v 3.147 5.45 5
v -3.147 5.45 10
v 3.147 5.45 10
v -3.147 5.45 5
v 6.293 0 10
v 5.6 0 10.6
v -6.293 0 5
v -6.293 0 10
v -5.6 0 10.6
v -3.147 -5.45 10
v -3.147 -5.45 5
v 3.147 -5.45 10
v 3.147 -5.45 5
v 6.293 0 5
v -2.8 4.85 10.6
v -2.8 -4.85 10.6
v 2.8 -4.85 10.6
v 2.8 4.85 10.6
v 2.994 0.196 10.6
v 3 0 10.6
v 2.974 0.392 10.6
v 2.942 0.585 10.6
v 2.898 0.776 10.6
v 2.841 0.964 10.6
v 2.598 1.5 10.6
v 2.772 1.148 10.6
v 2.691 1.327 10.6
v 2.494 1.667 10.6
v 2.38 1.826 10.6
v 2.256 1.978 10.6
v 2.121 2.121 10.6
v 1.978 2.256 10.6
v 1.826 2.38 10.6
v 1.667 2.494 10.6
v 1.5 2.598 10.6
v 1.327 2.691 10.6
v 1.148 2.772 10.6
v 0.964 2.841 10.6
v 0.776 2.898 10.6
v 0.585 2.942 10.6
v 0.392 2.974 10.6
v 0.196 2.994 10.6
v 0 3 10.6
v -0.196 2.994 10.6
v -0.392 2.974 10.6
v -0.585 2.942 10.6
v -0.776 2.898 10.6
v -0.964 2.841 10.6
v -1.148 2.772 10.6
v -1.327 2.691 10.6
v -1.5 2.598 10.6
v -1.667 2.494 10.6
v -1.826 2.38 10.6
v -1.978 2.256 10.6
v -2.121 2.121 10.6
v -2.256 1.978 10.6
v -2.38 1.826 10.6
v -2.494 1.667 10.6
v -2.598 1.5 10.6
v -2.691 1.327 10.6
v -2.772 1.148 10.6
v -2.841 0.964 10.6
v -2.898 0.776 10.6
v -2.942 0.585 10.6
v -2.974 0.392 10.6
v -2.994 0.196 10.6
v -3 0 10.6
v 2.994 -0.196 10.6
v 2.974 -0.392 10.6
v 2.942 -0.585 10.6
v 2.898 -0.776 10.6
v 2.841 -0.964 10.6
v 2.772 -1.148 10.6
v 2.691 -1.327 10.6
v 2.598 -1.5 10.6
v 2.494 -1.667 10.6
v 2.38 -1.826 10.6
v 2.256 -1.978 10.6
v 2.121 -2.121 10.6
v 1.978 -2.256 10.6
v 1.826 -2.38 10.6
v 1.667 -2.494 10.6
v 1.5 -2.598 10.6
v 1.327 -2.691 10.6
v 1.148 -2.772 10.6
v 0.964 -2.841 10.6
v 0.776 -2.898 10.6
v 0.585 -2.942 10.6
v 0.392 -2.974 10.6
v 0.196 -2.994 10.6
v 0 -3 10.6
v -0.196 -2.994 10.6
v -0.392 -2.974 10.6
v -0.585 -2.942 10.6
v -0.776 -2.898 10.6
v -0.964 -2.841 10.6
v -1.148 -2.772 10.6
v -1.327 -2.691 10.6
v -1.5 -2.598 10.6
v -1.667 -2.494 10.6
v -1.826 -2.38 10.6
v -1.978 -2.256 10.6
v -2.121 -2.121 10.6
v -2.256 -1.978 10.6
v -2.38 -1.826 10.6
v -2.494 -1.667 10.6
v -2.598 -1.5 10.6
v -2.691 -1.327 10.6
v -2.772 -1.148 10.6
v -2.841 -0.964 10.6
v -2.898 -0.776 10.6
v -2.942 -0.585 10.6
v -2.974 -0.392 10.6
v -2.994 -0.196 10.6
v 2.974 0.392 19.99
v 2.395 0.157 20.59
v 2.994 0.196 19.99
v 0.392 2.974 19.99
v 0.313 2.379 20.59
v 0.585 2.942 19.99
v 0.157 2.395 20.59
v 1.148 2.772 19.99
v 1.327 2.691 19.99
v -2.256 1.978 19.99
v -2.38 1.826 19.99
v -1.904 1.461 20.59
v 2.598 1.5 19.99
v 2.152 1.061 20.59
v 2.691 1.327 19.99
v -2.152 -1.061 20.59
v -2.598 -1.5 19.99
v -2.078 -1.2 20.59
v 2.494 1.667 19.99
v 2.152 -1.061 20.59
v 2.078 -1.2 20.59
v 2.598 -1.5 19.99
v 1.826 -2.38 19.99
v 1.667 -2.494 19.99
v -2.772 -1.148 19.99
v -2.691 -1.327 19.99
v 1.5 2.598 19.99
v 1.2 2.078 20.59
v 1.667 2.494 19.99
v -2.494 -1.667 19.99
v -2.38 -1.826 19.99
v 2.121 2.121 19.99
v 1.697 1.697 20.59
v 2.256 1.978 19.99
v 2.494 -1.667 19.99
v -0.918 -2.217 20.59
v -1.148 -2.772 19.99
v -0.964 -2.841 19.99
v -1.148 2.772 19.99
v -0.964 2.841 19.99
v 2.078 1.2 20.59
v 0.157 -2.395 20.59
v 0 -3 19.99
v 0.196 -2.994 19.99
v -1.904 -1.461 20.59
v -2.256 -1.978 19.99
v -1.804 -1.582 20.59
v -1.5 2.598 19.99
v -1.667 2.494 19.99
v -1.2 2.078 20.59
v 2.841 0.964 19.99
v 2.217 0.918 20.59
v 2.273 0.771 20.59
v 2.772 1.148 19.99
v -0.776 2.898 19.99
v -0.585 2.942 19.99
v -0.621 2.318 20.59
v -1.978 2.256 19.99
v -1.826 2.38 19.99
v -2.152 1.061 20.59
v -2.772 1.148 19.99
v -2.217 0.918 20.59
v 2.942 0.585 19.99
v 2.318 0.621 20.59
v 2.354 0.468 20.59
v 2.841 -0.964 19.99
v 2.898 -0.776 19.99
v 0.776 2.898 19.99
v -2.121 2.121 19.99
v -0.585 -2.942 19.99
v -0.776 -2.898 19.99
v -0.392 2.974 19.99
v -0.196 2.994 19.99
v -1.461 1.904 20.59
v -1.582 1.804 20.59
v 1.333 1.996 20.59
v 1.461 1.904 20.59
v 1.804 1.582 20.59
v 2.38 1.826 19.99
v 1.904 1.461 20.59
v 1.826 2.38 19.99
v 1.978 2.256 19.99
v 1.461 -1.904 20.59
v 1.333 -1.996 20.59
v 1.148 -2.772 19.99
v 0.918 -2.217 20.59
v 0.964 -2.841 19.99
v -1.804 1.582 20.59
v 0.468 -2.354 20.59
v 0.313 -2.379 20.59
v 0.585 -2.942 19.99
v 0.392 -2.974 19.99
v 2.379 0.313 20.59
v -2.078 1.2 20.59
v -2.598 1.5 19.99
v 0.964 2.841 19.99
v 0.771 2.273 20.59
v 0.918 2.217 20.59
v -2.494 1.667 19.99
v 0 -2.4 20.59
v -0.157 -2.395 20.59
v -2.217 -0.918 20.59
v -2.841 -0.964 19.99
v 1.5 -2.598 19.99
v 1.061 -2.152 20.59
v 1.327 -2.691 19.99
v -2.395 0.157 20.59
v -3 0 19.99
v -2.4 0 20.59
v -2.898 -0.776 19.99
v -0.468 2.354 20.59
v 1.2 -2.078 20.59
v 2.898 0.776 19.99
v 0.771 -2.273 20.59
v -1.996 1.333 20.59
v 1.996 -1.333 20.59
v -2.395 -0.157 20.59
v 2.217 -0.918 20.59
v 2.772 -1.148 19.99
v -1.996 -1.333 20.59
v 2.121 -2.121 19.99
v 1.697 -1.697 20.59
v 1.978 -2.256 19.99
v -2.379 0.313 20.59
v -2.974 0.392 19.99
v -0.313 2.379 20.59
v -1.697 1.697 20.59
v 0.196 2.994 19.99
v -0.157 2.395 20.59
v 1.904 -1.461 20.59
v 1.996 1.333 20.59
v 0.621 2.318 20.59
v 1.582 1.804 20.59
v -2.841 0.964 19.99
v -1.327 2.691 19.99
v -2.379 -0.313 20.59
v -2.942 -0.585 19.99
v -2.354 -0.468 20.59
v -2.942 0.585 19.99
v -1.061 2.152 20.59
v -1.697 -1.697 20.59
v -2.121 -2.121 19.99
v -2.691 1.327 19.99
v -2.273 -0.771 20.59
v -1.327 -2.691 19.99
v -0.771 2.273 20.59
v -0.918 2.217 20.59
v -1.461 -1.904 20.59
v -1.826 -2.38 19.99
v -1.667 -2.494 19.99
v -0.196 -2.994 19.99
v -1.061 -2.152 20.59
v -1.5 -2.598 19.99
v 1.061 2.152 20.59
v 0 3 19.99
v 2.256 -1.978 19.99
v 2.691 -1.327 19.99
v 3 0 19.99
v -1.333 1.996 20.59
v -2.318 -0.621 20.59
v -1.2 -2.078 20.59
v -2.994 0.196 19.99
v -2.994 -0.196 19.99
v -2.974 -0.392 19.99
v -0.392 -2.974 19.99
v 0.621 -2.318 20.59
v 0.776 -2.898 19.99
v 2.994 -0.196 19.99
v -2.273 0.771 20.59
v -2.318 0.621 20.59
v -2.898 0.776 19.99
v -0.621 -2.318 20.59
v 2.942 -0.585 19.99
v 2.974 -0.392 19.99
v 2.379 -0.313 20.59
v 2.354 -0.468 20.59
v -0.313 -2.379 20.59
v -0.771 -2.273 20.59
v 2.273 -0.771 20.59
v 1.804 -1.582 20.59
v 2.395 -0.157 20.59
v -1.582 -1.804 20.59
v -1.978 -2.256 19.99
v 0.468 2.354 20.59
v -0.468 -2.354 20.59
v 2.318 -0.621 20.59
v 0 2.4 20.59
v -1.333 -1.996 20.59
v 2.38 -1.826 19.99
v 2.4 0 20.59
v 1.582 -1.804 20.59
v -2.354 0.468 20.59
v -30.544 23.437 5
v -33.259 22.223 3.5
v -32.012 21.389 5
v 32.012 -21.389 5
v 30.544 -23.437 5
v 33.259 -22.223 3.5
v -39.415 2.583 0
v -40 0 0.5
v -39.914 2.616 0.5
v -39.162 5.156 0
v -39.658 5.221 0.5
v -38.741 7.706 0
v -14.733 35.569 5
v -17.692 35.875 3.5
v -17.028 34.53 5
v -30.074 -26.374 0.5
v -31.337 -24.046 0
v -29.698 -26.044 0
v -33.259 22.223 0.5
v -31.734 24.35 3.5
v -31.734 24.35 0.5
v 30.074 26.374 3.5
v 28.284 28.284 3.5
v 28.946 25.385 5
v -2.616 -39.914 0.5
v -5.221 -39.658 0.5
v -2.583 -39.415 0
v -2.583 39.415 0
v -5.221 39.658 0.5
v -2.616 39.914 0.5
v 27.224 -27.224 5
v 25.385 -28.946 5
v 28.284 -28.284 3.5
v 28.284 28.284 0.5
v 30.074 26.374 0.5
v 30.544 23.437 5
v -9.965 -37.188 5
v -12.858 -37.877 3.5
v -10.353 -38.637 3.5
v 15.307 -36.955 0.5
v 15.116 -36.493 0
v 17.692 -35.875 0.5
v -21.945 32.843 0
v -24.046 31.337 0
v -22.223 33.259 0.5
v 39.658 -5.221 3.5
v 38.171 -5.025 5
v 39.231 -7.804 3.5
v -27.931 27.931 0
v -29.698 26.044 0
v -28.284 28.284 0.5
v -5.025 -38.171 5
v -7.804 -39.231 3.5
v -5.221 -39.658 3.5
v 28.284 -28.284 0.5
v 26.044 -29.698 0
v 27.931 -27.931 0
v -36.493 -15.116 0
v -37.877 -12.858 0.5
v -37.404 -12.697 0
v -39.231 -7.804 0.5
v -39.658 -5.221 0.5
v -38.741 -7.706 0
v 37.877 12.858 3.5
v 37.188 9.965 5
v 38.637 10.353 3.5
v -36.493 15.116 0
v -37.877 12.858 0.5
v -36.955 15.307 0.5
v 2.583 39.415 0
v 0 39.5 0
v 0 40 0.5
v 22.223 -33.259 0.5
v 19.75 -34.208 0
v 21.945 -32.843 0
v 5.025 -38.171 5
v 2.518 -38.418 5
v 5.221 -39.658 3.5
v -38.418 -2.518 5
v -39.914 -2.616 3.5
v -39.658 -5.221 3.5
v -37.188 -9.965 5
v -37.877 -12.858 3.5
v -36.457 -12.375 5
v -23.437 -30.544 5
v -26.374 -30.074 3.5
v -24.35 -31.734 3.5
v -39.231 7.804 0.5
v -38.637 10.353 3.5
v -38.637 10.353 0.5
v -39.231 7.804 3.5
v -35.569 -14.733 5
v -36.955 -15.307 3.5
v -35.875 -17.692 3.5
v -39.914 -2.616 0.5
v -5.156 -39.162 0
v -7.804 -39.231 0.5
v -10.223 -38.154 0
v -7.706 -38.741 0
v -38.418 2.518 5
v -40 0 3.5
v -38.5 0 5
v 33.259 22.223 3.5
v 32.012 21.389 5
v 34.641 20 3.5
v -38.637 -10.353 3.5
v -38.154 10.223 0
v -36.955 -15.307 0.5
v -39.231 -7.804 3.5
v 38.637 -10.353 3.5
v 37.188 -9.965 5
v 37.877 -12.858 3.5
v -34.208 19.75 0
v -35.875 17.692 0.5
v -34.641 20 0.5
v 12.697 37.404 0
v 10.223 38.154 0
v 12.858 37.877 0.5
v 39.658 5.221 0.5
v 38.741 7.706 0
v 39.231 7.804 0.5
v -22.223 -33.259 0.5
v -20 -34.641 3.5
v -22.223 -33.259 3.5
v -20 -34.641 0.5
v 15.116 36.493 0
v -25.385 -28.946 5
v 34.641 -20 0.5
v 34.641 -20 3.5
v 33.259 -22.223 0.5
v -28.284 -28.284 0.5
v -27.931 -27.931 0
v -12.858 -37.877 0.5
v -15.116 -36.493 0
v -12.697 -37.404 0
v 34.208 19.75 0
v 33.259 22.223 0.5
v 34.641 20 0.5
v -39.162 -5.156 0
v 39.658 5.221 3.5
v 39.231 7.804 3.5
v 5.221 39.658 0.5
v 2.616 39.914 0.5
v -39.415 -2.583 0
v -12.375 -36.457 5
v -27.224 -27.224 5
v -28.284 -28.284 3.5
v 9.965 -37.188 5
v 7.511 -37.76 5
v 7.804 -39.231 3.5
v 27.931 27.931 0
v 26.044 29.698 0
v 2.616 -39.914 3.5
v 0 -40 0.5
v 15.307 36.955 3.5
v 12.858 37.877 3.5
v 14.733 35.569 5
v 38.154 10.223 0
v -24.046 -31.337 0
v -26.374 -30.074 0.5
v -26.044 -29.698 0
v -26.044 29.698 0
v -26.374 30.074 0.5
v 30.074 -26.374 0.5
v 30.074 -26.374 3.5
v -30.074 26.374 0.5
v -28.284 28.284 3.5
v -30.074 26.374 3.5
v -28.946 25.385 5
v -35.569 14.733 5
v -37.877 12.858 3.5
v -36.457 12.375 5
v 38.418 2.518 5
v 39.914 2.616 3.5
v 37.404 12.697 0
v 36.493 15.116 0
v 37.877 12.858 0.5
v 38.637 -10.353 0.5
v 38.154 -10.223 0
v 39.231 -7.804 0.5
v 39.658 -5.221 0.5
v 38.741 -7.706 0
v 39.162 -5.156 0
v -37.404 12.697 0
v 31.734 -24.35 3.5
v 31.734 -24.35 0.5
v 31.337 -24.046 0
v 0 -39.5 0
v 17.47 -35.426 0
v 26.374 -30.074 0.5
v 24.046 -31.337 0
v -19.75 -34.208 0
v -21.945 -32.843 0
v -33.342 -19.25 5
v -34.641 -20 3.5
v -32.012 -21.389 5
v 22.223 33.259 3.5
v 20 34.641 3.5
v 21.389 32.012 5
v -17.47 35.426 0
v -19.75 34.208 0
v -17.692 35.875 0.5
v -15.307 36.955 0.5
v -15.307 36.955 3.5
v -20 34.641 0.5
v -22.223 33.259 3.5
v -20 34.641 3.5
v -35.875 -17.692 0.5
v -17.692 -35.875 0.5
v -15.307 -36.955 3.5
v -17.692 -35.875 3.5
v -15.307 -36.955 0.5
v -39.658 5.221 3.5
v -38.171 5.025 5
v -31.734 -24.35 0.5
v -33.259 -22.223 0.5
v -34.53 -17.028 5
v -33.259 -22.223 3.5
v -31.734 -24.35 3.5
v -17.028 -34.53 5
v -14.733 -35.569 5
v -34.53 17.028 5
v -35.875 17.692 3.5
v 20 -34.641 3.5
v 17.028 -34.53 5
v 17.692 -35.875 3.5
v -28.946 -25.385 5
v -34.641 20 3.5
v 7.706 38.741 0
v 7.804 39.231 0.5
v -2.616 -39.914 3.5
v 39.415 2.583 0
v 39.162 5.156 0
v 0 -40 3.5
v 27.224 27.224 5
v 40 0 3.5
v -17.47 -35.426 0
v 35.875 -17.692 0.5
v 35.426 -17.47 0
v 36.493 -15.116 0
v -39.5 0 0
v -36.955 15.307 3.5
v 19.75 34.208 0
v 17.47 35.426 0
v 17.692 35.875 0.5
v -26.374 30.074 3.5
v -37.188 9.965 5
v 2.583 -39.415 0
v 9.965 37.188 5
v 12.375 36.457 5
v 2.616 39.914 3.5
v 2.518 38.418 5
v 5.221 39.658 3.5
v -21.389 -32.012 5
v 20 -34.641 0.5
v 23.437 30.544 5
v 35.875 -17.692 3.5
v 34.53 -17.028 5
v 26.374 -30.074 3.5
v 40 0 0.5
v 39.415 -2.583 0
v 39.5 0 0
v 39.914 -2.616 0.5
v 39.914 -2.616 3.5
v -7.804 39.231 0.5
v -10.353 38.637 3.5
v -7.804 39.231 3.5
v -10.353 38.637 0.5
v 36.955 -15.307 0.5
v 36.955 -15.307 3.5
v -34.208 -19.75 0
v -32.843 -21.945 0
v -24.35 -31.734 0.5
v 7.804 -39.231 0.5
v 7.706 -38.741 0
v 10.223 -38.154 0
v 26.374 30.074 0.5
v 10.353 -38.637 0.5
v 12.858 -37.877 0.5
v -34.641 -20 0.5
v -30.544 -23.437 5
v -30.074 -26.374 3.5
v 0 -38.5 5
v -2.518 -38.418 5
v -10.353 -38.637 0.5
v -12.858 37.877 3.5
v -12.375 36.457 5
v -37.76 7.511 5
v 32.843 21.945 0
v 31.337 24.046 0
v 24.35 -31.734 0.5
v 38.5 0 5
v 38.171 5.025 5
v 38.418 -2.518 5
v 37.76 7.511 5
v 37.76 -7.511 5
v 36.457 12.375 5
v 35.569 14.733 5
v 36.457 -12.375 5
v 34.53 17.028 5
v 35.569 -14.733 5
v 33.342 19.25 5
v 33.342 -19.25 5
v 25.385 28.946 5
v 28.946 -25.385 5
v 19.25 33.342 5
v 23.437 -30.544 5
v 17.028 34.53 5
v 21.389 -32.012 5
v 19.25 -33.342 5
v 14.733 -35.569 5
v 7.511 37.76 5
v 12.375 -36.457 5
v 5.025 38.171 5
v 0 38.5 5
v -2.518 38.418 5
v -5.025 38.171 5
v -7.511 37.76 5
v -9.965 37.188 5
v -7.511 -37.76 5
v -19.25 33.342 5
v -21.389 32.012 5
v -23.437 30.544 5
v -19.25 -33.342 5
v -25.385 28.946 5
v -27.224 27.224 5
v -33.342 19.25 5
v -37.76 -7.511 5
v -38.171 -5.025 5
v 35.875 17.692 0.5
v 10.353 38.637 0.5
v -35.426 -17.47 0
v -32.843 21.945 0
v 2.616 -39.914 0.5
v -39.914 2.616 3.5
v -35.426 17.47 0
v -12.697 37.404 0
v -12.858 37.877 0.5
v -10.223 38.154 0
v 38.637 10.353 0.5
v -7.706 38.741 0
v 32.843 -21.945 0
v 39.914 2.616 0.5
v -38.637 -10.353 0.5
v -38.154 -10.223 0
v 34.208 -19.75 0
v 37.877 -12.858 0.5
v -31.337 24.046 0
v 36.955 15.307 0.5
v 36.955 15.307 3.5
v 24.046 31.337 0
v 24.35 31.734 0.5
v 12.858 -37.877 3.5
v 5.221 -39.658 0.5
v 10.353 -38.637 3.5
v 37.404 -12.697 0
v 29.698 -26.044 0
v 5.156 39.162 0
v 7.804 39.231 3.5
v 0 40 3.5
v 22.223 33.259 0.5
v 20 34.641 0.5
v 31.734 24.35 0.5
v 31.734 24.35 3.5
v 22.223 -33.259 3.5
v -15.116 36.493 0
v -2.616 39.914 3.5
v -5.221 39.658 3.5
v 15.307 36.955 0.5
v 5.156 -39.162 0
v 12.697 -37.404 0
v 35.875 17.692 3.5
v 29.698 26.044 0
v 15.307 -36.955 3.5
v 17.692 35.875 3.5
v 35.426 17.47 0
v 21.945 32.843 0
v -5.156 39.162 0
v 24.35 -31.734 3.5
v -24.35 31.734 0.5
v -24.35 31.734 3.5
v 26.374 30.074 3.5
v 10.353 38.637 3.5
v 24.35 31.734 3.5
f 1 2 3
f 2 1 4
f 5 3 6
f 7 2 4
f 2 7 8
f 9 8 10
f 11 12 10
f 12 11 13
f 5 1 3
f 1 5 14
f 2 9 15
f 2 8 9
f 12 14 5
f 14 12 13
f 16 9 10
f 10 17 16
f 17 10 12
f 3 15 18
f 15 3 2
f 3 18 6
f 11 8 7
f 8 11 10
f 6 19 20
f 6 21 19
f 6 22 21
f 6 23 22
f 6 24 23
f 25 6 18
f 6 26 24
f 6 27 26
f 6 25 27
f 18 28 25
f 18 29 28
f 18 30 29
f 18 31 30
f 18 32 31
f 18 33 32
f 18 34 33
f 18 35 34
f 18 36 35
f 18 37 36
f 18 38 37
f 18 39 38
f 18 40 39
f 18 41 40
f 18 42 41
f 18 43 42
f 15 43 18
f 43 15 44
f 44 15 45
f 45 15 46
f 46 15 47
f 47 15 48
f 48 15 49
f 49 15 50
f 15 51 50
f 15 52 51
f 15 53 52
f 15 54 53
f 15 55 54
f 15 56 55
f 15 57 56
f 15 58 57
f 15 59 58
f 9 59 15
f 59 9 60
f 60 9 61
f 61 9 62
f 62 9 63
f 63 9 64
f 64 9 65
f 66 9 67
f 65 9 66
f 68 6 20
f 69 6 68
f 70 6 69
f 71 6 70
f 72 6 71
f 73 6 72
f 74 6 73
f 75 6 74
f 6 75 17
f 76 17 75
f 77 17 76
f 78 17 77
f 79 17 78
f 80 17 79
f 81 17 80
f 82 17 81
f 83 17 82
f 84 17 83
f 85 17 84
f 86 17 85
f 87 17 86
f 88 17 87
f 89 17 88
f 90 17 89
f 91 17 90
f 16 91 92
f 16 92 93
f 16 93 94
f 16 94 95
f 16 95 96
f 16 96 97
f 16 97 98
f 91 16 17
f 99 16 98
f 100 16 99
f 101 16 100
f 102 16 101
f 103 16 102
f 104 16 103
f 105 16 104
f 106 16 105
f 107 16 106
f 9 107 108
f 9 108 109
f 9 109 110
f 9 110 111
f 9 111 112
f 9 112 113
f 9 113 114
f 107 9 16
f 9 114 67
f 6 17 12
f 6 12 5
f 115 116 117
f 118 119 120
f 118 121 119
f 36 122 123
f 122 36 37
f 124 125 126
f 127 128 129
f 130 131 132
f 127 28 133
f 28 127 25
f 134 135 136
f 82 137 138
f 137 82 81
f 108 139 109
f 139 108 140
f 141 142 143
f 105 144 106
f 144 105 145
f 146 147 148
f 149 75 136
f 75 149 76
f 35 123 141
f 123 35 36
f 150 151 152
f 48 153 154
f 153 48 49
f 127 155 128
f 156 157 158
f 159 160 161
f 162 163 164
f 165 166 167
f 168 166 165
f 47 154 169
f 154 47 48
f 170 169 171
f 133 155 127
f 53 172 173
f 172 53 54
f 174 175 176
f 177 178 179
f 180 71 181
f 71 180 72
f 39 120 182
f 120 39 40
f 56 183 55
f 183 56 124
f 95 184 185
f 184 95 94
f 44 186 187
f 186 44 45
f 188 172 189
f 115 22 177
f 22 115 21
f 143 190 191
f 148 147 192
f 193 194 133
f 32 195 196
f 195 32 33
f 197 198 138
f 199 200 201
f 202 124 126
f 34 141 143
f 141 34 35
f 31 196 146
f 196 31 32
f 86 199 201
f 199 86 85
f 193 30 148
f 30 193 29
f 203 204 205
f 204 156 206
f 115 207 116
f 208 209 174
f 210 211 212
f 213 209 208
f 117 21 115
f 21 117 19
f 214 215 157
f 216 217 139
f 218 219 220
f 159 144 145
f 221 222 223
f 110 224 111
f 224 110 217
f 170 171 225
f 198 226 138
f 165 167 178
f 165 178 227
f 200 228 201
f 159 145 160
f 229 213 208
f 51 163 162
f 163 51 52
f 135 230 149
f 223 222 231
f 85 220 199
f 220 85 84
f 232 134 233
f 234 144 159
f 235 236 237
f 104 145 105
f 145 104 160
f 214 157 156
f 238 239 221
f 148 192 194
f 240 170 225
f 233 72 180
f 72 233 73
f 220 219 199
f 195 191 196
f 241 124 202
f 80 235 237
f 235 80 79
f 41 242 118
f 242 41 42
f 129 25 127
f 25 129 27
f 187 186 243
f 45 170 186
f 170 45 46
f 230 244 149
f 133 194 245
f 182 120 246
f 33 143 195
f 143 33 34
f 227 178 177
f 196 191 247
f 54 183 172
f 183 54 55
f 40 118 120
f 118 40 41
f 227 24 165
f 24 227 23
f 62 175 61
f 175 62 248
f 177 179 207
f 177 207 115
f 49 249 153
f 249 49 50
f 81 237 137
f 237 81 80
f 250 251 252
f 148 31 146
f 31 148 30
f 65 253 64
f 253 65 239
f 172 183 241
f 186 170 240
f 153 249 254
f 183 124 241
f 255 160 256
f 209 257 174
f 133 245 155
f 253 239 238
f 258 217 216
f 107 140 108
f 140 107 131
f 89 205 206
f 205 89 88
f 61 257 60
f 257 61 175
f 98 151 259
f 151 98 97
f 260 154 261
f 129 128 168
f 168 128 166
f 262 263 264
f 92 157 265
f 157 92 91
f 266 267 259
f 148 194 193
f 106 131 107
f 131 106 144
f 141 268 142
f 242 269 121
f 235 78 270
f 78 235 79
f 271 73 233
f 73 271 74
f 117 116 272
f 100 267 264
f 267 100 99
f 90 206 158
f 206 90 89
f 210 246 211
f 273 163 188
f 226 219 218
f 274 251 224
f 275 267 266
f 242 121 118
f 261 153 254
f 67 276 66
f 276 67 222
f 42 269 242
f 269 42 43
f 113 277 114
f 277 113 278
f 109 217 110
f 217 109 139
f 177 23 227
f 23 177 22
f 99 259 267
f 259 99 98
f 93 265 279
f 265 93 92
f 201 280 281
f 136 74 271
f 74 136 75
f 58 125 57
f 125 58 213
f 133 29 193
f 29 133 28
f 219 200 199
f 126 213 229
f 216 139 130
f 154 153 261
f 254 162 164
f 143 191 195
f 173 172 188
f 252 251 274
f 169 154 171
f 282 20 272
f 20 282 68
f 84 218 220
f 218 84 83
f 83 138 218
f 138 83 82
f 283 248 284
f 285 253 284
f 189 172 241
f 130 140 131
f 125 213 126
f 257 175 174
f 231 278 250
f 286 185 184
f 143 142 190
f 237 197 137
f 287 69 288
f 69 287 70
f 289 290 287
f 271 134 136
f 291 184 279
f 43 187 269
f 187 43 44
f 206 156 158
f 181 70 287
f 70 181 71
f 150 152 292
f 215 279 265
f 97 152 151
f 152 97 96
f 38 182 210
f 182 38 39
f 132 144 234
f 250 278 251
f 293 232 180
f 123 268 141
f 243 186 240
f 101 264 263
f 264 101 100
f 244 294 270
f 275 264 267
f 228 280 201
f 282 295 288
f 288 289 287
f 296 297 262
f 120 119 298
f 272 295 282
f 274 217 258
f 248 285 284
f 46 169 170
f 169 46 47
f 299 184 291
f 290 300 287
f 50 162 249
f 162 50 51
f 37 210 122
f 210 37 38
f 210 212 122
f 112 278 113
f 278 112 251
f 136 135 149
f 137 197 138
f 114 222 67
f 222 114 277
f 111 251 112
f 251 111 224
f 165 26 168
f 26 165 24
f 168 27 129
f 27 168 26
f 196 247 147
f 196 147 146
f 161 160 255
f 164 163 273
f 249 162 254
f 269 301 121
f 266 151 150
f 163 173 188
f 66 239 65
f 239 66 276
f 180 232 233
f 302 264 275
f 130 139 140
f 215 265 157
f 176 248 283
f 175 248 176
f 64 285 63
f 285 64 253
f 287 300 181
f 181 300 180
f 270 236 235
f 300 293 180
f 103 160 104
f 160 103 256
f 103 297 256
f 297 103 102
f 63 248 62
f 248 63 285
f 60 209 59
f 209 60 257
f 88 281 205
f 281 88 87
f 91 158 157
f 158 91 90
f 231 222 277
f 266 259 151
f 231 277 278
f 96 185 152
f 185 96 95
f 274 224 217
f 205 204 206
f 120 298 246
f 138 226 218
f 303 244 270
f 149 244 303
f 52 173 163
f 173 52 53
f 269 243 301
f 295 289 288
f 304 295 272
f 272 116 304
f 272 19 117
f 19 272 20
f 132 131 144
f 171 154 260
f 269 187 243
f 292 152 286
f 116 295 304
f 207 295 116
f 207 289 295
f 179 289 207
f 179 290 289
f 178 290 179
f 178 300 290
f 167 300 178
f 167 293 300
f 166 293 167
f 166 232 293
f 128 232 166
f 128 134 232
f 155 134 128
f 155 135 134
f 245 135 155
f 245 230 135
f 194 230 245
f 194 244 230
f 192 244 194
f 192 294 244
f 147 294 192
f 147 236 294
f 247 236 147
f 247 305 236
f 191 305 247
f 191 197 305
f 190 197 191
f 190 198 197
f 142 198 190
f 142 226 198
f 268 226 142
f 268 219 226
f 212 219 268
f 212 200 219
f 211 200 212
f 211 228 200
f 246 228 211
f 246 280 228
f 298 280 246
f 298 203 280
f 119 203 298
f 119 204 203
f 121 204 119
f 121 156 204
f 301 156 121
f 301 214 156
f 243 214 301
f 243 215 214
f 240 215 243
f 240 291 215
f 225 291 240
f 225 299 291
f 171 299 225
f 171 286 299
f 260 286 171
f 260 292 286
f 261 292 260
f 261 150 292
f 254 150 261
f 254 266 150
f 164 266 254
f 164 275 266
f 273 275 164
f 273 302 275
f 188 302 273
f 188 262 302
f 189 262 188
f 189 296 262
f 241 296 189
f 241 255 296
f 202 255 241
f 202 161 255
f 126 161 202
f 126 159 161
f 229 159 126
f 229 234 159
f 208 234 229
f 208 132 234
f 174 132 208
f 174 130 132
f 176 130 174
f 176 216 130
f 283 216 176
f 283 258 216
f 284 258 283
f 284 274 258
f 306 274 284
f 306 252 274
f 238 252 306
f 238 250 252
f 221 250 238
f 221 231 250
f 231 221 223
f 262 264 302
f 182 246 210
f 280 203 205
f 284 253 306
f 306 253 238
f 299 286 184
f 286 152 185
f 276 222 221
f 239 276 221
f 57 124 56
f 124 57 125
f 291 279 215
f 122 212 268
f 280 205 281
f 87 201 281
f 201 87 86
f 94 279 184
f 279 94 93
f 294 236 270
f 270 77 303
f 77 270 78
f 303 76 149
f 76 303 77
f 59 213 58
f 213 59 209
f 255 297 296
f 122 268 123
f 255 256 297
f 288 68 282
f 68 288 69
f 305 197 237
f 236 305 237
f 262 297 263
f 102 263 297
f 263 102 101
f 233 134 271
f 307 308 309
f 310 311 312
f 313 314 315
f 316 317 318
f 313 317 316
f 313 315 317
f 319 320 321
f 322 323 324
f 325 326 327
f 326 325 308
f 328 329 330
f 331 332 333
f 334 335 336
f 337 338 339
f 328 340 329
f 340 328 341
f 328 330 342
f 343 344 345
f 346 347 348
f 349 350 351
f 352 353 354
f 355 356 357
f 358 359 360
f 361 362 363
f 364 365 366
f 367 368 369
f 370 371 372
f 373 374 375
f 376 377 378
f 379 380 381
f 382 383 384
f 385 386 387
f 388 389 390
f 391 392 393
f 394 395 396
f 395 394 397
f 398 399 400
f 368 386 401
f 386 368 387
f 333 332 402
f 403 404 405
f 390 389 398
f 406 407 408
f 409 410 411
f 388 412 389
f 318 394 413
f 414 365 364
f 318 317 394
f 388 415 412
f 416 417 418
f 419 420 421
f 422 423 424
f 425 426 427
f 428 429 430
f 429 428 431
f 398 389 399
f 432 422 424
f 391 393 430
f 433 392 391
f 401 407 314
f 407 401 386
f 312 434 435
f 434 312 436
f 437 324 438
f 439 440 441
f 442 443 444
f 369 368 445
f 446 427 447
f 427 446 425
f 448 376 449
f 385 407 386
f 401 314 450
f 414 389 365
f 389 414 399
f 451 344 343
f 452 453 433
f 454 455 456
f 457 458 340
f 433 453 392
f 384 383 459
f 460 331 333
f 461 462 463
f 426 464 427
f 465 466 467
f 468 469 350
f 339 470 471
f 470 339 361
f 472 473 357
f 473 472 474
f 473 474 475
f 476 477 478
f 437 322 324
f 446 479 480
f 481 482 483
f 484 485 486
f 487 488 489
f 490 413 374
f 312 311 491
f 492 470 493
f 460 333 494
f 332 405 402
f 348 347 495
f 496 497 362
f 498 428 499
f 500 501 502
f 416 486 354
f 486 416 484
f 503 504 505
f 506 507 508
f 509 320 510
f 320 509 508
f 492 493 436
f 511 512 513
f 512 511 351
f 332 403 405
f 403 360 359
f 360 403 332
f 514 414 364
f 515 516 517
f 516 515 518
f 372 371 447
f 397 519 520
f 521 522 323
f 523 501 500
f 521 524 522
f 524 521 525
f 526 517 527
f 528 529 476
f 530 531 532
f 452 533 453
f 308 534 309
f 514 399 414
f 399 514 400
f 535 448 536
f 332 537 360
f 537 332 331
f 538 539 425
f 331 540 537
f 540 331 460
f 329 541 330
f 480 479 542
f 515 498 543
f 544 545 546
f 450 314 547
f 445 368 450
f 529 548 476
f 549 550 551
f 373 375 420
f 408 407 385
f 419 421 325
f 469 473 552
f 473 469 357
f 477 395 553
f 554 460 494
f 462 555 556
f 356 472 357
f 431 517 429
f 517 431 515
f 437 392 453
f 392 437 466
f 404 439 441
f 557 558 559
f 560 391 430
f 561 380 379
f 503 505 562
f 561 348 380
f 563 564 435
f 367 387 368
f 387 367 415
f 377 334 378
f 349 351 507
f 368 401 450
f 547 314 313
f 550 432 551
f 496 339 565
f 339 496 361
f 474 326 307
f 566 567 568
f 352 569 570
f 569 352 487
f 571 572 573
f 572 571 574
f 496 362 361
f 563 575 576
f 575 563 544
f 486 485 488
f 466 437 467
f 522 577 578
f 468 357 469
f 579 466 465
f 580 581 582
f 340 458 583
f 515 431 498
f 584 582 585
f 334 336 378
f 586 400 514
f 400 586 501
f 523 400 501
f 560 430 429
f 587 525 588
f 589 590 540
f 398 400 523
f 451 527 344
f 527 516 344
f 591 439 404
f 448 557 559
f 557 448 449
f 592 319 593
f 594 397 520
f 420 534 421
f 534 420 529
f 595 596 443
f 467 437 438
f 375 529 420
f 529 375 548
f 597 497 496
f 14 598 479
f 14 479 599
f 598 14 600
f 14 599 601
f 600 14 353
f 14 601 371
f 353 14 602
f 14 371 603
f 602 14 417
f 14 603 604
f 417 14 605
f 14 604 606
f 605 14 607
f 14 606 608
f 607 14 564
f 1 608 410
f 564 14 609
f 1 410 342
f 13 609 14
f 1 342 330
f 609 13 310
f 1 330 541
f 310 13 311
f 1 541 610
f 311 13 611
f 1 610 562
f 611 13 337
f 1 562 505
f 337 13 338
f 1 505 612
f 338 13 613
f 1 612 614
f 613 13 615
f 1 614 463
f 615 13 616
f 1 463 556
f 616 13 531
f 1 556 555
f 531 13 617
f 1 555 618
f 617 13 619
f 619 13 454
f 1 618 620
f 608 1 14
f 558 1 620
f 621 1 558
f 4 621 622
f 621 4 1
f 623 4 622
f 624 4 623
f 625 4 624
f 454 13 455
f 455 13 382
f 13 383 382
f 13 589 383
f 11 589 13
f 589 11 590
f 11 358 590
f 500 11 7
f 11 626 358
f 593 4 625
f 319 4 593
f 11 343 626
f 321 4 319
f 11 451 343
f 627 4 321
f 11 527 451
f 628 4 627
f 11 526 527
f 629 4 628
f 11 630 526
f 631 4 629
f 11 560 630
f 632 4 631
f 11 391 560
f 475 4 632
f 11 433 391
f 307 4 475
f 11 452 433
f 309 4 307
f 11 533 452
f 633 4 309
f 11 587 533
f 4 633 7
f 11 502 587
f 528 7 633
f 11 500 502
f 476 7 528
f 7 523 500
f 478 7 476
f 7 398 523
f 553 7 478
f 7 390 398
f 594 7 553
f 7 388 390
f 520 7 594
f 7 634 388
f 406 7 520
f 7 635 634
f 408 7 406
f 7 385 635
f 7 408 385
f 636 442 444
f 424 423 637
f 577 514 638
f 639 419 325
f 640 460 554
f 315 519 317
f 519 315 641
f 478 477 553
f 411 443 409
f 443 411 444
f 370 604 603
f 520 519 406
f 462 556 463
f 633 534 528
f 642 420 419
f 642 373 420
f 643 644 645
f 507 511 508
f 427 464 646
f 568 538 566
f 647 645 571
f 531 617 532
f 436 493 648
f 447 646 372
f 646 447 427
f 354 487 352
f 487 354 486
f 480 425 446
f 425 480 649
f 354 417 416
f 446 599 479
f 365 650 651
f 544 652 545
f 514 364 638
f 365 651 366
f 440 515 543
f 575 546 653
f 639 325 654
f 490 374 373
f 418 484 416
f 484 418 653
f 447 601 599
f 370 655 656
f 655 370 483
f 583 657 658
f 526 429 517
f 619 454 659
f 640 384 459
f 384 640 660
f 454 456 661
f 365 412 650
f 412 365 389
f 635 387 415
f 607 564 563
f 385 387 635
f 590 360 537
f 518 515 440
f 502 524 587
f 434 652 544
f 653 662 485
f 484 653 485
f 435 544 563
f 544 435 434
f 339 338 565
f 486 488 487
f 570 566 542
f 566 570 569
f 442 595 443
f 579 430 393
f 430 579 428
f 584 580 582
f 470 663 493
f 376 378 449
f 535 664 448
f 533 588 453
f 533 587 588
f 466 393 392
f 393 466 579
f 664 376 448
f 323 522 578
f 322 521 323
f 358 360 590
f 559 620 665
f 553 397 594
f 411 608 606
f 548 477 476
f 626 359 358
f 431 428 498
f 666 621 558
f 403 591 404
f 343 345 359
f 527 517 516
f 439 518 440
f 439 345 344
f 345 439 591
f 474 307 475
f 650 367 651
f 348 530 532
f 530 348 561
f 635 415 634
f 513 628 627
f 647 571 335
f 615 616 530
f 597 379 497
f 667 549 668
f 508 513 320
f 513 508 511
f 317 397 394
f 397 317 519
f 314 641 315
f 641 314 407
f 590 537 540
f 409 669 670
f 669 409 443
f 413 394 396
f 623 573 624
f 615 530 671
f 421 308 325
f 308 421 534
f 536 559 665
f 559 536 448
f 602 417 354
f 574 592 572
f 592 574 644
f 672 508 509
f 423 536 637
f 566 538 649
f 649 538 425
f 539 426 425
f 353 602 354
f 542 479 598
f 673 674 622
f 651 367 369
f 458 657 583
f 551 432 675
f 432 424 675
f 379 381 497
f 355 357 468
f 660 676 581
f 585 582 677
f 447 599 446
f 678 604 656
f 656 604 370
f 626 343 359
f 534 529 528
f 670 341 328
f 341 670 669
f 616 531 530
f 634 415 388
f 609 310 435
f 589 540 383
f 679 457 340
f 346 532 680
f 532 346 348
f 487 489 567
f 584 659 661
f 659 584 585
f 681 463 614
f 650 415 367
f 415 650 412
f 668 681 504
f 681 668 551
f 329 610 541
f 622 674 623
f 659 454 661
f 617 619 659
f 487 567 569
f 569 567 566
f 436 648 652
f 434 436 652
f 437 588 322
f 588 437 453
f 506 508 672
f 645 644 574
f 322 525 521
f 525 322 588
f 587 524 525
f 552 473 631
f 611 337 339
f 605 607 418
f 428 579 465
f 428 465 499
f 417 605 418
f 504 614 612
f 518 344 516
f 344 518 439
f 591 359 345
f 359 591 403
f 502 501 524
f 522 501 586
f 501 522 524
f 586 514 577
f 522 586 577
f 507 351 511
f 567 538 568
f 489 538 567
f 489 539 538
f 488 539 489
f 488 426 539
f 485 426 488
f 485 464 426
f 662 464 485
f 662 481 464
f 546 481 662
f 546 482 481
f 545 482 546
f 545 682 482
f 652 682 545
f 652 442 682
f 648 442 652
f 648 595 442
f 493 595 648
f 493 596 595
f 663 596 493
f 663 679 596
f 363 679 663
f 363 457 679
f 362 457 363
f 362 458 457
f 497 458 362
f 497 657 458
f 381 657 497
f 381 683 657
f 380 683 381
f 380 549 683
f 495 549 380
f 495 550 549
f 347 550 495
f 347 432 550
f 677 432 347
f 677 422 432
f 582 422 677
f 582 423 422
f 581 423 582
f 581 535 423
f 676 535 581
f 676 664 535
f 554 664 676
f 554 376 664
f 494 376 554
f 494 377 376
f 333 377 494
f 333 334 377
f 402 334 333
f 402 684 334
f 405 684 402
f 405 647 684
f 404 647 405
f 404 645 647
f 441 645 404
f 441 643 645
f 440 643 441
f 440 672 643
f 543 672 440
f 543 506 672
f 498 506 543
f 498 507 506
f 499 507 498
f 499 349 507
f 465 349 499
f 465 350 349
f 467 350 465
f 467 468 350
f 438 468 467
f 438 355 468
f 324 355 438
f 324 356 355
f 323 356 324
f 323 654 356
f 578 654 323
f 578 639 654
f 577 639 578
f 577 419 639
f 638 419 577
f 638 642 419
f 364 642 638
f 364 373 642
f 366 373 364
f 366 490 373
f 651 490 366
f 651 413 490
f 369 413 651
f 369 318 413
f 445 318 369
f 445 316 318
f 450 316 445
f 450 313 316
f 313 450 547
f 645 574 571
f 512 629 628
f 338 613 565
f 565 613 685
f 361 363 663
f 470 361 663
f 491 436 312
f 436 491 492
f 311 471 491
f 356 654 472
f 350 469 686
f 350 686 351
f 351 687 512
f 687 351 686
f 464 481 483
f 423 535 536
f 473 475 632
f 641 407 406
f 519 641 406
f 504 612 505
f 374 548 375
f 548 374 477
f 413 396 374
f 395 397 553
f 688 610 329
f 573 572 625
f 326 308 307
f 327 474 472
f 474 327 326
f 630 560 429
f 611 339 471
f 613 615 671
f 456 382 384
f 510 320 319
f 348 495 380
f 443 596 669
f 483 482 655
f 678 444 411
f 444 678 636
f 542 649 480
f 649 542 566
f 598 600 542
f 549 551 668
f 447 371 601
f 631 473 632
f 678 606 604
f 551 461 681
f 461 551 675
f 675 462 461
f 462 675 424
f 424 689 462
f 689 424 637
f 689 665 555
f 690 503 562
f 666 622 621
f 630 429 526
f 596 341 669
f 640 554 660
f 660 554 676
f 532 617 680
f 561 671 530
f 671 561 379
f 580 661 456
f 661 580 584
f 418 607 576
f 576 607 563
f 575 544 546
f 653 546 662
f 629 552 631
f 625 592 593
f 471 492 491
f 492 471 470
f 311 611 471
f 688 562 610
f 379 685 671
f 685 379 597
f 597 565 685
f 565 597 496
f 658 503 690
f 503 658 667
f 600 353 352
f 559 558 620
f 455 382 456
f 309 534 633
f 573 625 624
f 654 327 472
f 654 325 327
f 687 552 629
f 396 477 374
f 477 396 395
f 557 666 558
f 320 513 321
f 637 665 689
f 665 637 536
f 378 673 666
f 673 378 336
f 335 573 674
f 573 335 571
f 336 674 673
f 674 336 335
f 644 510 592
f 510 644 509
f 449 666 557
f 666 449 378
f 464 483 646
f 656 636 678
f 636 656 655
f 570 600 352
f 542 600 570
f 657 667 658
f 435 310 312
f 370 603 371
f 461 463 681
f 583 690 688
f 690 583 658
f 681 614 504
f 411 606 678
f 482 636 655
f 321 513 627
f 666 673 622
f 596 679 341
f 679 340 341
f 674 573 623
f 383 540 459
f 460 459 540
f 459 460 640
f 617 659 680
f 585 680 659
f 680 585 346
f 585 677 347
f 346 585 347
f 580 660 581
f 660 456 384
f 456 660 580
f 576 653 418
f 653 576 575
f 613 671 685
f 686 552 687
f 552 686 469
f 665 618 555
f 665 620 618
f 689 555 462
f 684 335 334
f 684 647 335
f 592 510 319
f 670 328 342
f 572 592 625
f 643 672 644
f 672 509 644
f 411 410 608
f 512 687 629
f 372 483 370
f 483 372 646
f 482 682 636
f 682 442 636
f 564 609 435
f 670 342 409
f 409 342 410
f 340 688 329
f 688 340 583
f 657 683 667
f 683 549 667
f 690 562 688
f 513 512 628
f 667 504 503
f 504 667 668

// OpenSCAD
// Round desk base for eye_test_stand.scad: a hex pillar that drops into the stem's 1/4"-20 nut
// pocket, plus a pin up the screw hole above it so the stand doesn't wobble. The eye stands
// upright (no tilt - eye_test_foot.scad is the tilted alternative).
// PRINT as modelled (disc on the bed), no supports.
include <../../params.scad>

base_d   = 80;
base_t   = 5;
chamfer  = 1.5;                 // round the top edge
foot     = 0.5;                 // small bottom chamfer (elephant's foot)

// The stand's pocket (eye_test_stand.scad: nut_14 = 11.41 across flats x 5.9 deep, then a
// 6.6 screw hole 12 mm further). Both printed sideways in the stem, so they come out ~0.4 small.
hex_af   = 10.9;                // across flats as drawn: prints ~10.8 in a ~11.0 pocket
hex_h    = 5.6;                 // just under the pocket depth, so the stem end sits on the disc
pin_d    = 6.0;                 // prints ~5.9 in a ~6.2 hole
pin_h    = 10;                  // above the hex (the hole goes 12.1)
lead     = 0.6;                 // lead-in chamfers

$fn = 96;

module disc() {
    hull() {
        cylinder(d = base_d - 2 * foot, h = 0.01);
        translate([0, 0, foot]) cylinder(d = base_d, h = base_t - foot - chamfer);
        translate([0, 0, base_t - 0.01]) cylinder(d = base_d - 2 * chamfer, h = 0.01);
    }
}

module hex(af, h) {
    d = af / cos(30);
    hull() {
        cylinder(d = d, h = h - lead, $fn = 6);
        cylinder(d = d - 2 * lead / cos(30), h = h, $fn = 6);
    }
}

module pin() {
    hull() {
        cylinder(d = pin_d, h = pin_h - lead);
        cylinder(d = pin_d - 2 * lead, h = pin_h);
    }
}

union() {
    disc();
    translate([0, 0, base_t - 0.01]) {
        hex(hex_af, hex_h + 0.01);
        translate([0, 0, hex_h]) pin();
    }
}
